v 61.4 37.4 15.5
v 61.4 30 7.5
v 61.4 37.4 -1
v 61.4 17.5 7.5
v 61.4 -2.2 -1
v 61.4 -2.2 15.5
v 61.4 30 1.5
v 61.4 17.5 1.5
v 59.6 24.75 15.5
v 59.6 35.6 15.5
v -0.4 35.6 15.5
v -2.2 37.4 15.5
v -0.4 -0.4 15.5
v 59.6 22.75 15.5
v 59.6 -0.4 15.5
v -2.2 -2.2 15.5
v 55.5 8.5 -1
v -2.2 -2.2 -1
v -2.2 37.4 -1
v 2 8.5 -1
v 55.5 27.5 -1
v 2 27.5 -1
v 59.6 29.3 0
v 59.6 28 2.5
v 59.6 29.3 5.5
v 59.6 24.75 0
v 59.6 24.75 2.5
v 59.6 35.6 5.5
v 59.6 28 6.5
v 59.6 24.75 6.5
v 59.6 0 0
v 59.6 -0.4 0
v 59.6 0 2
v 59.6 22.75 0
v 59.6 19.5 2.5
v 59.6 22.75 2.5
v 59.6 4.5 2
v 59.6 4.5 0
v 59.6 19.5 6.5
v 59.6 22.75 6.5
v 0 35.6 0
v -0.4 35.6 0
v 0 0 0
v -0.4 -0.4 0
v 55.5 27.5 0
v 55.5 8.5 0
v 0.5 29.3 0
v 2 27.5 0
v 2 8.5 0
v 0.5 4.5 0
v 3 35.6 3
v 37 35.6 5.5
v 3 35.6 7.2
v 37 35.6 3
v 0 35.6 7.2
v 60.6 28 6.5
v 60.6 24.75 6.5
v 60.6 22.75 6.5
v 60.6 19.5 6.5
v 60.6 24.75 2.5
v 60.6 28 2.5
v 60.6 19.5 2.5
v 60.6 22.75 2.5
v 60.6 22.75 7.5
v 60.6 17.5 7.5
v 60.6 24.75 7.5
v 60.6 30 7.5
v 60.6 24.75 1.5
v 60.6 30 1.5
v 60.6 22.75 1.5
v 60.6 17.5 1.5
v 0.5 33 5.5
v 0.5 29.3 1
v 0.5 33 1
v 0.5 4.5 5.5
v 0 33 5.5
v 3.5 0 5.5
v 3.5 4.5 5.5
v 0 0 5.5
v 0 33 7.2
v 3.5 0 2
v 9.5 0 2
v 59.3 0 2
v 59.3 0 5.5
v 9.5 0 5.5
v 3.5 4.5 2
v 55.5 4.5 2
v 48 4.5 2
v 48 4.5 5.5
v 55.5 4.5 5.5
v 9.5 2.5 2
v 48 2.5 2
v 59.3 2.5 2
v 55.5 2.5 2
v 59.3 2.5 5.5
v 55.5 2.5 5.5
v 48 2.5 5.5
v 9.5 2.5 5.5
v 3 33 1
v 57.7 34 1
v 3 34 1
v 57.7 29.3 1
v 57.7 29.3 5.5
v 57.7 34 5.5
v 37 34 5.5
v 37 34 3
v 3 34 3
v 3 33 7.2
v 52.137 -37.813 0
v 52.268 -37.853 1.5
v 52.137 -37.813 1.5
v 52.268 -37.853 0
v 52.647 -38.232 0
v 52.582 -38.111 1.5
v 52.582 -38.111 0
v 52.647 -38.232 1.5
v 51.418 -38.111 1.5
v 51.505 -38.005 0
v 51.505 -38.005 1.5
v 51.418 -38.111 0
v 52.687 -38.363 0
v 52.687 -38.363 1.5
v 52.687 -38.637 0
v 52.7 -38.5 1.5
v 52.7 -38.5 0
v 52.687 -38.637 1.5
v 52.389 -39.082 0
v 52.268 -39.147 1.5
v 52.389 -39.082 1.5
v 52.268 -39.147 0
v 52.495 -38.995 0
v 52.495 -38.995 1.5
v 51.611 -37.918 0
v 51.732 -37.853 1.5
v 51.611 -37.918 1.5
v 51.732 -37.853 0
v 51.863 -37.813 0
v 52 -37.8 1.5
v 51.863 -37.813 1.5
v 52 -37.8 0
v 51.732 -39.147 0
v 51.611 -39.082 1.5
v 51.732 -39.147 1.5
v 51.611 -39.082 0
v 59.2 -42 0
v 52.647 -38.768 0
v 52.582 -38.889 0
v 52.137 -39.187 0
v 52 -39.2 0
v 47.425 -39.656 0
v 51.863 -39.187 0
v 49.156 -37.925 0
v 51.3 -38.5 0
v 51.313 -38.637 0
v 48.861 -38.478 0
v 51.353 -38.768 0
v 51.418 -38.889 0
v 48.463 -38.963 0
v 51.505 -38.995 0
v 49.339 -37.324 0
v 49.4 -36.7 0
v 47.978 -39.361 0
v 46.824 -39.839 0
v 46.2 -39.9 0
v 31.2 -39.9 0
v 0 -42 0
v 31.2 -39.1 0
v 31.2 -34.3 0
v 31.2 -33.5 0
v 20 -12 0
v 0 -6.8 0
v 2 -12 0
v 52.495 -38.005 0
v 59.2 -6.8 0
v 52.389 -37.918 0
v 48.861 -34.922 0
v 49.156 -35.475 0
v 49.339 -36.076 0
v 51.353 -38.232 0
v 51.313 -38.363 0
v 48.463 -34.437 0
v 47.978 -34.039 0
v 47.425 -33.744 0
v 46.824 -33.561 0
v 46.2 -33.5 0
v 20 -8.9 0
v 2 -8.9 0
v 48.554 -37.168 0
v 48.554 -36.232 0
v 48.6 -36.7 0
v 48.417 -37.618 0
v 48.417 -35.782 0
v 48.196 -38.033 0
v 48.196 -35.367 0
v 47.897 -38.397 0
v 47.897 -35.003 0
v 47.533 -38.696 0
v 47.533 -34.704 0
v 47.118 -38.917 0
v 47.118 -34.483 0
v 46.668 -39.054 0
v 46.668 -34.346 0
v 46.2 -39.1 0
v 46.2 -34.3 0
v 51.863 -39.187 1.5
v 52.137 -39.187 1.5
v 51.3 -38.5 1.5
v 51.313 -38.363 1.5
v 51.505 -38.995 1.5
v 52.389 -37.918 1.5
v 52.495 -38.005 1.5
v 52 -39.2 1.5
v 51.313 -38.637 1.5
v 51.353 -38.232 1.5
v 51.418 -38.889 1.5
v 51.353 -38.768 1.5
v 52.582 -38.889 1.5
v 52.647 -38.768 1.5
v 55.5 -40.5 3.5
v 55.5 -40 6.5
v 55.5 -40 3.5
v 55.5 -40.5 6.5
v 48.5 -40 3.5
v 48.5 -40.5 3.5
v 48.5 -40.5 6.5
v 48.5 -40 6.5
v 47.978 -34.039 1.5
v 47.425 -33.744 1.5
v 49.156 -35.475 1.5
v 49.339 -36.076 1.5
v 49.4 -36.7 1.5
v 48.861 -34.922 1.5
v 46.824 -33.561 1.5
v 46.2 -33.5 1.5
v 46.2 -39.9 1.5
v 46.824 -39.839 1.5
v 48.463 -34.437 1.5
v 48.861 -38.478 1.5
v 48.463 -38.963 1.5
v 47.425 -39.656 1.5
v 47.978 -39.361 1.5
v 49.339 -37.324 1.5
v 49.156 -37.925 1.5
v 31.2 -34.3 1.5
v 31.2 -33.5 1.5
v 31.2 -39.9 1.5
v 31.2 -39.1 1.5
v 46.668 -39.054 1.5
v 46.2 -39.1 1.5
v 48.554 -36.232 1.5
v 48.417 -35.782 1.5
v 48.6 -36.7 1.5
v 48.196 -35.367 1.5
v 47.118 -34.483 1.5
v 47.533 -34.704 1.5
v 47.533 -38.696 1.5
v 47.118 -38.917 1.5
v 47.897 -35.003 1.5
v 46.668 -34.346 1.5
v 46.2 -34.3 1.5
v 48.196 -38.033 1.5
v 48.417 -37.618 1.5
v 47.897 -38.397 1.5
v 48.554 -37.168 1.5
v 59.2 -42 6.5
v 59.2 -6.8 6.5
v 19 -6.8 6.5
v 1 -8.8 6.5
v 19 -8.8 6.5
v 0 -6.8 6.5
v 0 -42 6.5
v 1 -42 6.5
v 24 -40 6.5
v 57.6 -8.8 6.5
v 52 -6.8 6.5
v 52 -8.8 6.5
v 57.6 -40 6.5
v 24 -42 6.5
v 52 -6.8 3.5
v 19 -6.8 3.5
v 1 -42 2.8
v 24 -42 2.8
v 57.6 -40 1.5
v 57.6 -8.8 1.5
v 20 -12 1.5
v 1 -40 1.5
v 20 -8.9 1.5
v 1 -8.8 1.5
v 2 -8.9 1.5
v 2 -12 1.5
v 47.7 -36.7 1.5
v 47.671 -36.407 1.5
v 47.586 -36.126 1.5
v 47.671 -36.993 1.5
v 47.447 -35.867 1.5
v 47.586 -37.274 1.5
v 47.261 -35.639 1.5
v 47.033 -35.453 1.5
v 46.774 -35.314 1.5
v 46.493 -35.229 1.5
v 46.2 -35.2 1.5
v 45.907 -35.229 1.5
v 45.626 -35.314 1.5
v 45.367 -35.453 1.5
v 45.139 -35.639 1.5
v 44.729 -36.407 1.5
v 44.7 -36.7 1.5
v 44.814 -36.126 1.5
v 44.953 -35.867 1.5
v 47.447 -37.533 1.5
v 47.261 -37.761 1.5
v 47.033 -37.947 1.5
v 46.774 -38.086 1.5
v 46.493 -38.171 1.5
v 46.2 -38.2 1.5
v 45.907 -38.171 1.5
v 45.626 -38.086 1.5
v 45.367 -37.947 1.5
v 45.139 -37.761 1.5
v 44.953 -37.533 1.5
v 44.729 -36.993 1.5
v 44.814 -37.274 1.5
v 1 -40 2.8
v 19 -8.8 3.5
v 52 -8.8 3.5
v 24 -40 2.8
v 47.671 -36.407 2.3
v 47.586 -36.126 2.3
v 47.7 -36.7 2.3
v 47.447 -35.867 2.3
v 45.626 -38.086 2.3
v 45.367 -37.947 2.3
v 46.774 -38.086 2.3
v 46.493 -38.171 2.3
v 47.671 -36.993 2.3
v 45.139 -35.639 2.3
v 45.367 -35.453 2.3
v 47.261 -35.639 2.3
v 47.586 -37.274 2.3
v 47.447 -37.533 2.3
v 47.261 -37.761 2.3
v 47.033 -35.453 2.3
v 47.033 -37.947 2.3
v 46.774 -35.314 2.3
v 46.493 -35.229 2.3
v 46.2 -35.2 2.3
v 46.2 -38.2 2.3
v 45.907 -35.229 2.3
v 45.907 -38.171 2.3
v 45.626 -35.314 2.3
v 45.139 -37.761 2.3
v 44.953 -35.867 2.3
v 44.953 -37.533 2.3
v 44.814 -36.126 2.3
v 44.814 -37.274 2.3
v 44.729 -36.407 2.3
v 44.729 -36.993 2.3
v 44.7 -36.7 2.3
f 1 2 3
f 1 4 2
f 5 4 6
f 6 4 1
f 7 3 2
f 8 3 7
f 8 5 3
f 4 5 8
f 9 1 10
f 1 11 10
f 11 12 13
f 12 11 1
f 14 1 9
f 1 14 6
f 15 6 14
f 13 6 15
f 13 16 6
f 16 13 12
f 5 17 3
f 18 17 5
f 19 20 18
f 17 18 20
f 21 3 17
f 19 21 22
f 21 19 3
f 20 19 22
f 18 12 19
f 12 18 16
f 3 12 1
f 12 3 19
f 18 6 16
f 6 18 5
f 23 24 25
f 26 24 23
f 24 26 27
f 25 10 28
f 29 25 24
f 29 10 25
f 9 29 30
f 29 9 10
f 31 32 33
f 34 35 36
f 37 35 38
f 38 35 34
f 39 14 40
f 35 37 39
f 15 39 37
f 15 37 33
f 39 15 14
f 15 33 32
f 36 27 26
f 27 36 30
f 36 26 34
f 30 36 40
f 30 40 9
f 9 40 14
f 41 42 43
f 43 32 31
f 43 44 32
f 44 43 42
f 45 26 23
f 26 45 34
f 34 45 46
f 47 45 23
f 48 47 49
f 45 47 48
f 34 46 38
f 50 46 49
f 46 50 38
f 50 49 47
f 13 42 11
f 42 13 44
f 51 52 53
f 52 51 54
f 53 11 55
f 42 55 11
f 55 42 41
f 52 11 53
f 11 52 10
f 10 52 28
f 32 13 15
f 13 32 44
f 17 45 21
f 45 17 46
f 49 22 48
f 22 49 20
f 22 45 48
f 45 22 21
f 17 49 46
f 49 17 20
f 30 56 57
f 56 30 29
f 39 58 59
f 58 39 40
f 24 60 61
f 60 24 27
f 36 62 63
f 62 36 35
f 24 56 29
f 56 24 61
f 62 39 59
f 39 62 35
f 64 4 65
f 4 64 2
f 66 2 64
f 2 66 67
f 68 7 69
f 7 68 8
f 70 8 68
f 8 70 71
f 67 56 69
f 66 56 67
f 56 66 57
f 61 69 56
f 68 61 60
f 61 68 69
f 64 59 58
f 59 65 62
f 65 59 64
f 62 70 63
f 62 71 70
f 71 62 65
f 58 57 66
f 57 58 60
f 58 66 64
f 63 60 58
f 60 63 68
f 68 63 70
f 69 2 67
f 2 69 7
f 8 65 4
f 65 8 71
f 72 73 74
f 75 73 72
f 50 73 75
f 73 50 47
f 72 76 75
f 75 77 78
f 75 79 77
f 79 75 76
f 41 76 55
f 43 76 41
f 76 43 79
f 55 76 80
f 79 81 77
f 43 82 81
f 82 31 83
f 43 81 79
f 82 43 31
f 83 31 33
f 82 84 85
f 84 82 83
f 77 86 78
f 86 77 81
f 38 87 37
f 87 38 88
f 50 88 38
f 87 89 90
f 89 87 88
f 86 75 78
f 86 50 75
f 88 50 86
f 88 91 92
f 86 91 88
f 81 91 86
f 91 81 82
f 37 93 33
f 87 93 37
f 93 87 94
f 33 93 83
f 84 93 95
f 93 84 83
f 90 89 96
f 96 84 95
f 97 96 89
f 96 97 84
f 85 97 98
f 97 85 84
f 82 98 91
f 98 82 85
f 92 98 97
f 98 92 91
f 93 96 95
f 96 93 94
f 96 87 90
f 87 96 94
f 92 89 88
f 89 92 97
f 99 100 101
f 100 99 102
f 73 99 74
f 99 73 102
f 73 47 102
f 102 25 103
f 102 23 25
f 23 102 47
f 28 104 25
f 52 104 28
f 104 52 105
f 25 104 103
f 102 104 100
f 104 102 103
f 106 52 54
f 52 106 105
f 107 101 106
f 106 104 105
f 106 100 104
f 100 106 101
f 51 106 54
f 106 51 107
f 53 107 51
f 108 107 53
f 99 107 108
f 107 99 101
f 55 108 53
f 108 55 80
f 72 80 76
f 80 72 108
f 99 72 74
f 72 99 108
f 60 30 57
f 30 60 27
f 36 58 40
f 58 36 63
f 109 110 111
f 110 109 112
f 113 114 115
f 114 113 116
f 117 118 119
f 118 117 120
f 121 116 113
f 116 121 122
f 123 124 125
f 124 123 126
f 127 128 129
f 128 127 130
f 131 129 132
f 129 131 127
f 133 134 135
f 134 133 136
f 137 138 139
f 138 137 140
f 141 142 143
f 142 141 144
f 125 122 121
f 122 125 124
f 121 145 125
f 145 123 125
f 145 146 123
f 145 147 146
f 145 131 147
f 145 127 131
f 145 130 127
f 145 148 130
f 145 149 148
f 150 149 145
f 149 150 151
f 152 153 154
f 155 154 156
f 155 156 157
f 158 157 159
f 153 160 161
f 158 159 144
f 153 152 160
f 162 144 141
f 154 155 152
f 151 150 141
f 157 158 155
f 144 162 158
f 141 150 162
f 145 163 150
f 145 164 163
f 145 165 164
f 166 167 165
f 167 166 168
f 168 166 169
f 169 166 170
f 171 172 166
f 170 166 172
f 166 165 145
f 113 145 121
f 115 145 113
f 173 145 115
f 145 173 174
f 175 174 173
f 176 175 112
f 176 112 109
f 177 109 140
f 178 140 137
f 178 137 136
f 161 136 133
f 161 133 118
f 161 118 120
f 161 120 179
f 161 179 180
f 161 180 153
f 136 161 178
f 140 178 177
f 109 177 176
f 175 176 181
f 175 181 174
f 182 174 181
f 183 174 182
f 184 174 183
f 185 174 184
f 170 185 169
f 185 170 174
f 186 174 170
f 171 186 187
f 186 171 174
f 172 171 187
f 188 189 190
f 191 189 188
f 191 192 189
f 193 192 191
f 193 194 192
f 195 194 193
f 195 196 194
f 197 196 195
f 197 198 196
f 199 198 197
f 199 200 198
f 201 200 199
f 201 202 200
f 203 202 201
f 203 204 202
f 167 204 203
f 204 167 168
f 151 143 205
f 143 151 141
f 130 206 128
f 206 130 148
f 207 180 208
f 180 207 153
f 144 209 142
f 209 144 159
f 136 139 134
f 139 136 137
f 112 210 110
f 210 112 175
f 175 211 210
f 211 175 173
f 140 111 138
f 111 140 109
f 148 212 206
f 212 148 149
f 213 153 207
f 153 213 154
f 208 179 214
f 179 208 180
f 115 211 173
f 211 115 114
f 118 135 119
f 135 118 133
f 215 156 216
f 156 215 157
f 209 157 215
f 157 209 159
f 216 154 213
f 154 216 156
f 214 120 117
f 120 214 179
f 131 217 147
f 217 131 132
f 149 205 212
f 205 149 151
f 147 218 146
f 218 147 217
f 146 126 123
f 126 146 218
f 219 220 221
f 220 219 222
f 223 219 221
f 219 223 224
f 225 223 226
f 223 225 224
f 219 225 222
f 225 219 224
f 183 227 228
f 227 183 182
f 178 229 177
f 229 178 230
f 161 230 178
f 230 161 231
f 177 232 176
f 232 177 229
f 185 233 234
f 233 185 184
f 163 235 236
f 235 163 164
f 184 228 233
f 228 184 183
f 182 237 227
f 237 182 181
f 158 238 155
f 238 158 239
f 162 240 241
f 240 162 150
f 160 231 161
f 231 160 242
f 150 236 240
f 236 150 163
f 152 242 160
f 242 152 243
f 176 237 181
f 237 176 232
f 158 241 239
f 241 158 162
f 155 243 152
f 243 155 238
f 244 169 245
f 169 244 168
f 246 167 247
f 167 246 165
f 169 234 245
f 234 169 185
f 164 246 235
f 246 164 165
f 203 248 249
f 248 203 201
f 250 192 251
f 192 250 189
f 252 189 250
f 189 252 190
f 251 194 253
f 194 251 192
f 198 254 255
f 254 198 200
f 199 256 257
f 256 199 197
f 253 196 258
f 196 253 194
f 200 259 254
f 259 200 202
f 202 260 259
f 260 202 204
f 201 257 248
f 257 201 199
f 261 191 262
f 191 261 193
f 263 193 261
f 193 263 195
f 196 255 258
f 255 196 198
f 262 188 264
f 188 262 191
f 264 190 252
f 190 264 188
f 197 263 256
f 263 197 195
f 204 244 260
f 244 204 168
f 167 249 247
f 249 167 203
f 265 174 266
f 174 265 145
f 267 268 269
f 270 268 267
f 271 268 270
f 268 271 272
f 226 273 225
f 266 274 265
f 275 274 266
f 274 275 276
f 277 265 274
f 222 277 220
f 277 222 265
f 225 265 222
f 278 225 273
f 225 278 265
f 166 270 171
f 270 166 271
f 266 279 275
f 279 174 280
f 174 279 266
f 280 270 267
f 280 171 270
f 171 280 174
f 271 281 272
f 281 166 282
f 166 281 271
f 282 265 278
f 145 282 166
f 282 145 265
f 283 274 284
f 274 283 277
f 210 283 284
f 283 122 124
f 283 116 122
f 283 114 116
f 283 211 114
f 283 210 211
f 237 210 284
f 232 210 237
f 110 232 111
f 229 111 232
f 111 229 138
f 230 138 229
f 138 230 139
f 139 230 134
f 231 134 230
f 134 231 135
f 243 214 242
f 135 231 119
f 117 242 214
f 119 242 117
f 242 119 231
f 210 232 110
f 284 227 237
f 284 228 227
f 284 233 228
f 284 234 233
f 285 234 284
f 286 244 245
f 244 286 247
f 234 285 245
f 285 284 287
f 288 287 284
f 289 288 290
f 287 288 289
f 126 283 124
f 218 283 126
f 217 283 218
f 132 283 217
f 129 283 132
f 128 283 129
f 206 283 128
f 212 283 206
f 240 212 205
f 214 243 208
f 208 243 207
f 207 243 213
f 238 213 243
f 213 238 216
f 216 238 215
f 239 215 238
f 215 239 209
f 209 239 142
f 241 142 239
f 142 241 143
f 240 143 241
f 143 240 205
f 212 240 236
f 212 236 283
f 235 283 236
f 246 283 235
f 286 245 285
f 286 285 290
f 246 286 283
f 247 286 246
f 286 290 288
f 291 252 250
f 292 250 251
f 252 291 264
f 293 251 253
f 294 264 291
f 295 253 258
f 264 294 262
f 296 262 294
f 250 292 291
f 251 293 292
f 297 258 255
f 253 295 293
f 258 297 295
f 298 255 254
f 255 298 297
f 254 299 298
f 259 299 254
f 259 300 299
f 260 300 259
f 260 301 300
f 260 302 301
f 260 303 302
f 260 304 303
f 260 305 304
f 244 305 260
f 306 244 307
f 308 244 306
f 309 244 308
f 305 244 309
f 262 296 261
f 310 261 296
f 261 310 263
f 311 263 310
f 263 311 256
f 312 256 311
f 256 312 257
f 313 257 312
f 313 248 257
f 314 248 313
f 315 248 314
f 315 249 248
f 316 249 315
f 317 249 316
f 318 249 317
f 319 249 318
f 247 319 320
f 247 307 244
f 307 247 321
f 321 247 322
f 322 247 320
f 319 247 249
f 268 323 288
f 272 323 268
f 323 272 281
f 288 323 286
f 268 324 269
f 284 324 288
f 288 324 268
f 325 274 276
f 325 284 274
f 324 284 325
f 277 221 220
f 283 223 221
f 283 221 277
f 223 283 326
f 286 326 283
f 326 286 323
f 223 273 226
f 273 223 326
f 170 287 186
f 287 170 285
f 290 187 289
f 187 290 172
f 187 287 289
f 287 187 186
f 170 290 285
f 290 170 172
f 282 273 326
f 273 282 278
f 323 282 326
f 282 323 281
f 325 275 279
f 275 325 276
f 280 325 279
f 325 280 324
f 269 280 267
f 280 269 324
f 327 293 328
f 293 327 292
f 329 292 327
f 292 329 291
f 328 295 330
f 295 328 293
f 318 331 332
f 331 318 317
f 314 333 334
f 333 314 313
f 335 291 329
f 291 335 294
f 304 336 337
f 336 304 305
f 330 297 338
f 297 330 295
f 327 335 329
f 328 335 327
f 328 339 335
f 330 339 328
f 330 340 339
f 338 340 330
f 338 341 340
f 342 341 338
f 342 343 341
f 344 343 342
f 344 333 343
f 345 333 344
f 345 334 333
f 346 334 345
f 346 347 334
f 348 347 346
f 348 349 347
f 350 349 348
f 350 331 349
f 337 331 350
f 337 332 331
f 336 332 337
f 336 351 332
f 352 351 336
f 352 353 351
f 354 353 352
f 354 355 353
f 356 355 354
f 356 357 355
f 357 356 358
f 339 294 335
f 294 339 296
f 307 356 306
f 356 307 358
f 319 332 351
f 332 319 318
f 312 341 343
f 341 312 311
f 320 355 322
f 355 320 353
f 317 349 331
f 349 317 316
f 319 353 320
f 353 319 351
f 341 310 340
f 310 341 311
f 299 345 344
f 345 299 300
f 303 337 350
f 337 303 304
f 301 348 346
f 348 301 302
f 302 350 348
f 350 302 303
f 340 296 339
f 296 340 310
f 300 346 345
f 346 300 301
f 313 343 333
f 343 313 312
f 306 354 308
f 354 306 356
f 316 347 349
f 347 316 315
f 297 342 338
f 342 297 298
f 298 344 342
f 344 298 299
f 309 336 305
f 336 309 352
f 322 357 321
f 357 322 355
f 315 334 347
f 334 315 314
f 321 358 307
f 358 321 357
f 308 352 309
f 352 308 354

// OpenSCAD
fx=0.4; //缝隙 pla要留缝隙， 光敏树脂可以缝隙=0,
x=59.2;
y=35.2;
z=15.5;
bh=2.2;//壁的厚度
reset=[bh+44,5.3,0]; //reset按键的位置
dl=[52,3.5,0]; //download按键的位置
bhz=1; //垂直的壁厚
$fn=32; //圆型结构的精细度 1/32


top();  //顶盖 
translate([0,-42,0]) //y向偏移42mm 
 bottom(); //底盖




//下面是子程序 模块

module top() { //顶盖部分 
 difference(){
  translate([-bh,-bh,-bhz]) cube([x+bh+bh,y+bh+bh,z+bhz]);
  translate([-fx,-fx,0]) cube([x+fx+fx,y+fx+fx,z]);
  translate([2,8.5,-bhz]) cube([53.5,19,z]);
  translate([x,19.5,2.5]) cube([10,8.5,4]); //usb孔
  translate([x+1+fx,19.5-2,2.5-1]) cube([10,8.5+4,4+2]); //usb框
 }
 cube([0.5,bh+y,5.5]);//lcd边条
 cube([3.5,4.5,5.5]);
 cube([x+bh,4.5,2]);
 translate([9.5,0,0]) cube([x-9.5+0.1,2.5,5.5]);
 translate([48,0,0]) cube([7.5,4.5,5.5]);
 translate([0,29.3,0])
 cube([x+bh,y-29.3,2-1]);

 translate([x-1.5,29.3,0]) cube([1.5+bh-1,bh+y-29.3,5.5]);
 translate([37,34,0]) cube([2.3+19+bh,bh+y-34,5.5]);
 translate([0,34,0]) cube([x,bh+y-34,3]);
 translate([0,33,0]) cube([3,bh+y-33,5.5+1.2+0.5]);
  translate([x+fx,19.5+8.5/2-1,0]) cube([1,2,z]); //usb支撑
}

module switch(){  //按钮开关结构
 fx1=0.8;
 bh=2;
 if(fx>0) { //fx>0 是pla打印，按键的缝隙要宽一点
  fx1=1.6;
 }
 r1=4.8+fx1+fx1;
 difference(){
  union(){
   cylinder(r=r1/2,h=bh);
   translate([-15,-r1/2,0]) cube([15,r1,bh]);
  }//union
  cylinder(r=r1/2-fx1,h=bh);
  translate([-15,-r1/2+fx1,0]) cube([15,r1-fx1-fx1,bh]);
 }//diff
}

module bottom(){ //底盖部分
 z1=5+1.5; //厚度
 bh=2;      //壁厚
 difference(){
  cube([x,y,z1]);
  translate([1,bh,1.5]) cube([x-1-1.6,y-bh-bh,z1]);
  translate([2,30,0]) cube([18,3.1,z1]); //com1
  translate([1,0,z1-3.7]) cube([23,bh,z1]);//电池
  translate([1+18,y-bh,1.5+2]) cube([33,bh,z1]);//天线
  translate(dl) {
   cylinder(r=0.7,h=bh);
   translate([-7/2,-4/2,z1-3]) cube([7,4,z1]); //3x6 开关
  }
  translate(reset) switch();
 }
 translate(reset) cylinder(r=3/2,h=z1-4.2);//按键中心柱
}
